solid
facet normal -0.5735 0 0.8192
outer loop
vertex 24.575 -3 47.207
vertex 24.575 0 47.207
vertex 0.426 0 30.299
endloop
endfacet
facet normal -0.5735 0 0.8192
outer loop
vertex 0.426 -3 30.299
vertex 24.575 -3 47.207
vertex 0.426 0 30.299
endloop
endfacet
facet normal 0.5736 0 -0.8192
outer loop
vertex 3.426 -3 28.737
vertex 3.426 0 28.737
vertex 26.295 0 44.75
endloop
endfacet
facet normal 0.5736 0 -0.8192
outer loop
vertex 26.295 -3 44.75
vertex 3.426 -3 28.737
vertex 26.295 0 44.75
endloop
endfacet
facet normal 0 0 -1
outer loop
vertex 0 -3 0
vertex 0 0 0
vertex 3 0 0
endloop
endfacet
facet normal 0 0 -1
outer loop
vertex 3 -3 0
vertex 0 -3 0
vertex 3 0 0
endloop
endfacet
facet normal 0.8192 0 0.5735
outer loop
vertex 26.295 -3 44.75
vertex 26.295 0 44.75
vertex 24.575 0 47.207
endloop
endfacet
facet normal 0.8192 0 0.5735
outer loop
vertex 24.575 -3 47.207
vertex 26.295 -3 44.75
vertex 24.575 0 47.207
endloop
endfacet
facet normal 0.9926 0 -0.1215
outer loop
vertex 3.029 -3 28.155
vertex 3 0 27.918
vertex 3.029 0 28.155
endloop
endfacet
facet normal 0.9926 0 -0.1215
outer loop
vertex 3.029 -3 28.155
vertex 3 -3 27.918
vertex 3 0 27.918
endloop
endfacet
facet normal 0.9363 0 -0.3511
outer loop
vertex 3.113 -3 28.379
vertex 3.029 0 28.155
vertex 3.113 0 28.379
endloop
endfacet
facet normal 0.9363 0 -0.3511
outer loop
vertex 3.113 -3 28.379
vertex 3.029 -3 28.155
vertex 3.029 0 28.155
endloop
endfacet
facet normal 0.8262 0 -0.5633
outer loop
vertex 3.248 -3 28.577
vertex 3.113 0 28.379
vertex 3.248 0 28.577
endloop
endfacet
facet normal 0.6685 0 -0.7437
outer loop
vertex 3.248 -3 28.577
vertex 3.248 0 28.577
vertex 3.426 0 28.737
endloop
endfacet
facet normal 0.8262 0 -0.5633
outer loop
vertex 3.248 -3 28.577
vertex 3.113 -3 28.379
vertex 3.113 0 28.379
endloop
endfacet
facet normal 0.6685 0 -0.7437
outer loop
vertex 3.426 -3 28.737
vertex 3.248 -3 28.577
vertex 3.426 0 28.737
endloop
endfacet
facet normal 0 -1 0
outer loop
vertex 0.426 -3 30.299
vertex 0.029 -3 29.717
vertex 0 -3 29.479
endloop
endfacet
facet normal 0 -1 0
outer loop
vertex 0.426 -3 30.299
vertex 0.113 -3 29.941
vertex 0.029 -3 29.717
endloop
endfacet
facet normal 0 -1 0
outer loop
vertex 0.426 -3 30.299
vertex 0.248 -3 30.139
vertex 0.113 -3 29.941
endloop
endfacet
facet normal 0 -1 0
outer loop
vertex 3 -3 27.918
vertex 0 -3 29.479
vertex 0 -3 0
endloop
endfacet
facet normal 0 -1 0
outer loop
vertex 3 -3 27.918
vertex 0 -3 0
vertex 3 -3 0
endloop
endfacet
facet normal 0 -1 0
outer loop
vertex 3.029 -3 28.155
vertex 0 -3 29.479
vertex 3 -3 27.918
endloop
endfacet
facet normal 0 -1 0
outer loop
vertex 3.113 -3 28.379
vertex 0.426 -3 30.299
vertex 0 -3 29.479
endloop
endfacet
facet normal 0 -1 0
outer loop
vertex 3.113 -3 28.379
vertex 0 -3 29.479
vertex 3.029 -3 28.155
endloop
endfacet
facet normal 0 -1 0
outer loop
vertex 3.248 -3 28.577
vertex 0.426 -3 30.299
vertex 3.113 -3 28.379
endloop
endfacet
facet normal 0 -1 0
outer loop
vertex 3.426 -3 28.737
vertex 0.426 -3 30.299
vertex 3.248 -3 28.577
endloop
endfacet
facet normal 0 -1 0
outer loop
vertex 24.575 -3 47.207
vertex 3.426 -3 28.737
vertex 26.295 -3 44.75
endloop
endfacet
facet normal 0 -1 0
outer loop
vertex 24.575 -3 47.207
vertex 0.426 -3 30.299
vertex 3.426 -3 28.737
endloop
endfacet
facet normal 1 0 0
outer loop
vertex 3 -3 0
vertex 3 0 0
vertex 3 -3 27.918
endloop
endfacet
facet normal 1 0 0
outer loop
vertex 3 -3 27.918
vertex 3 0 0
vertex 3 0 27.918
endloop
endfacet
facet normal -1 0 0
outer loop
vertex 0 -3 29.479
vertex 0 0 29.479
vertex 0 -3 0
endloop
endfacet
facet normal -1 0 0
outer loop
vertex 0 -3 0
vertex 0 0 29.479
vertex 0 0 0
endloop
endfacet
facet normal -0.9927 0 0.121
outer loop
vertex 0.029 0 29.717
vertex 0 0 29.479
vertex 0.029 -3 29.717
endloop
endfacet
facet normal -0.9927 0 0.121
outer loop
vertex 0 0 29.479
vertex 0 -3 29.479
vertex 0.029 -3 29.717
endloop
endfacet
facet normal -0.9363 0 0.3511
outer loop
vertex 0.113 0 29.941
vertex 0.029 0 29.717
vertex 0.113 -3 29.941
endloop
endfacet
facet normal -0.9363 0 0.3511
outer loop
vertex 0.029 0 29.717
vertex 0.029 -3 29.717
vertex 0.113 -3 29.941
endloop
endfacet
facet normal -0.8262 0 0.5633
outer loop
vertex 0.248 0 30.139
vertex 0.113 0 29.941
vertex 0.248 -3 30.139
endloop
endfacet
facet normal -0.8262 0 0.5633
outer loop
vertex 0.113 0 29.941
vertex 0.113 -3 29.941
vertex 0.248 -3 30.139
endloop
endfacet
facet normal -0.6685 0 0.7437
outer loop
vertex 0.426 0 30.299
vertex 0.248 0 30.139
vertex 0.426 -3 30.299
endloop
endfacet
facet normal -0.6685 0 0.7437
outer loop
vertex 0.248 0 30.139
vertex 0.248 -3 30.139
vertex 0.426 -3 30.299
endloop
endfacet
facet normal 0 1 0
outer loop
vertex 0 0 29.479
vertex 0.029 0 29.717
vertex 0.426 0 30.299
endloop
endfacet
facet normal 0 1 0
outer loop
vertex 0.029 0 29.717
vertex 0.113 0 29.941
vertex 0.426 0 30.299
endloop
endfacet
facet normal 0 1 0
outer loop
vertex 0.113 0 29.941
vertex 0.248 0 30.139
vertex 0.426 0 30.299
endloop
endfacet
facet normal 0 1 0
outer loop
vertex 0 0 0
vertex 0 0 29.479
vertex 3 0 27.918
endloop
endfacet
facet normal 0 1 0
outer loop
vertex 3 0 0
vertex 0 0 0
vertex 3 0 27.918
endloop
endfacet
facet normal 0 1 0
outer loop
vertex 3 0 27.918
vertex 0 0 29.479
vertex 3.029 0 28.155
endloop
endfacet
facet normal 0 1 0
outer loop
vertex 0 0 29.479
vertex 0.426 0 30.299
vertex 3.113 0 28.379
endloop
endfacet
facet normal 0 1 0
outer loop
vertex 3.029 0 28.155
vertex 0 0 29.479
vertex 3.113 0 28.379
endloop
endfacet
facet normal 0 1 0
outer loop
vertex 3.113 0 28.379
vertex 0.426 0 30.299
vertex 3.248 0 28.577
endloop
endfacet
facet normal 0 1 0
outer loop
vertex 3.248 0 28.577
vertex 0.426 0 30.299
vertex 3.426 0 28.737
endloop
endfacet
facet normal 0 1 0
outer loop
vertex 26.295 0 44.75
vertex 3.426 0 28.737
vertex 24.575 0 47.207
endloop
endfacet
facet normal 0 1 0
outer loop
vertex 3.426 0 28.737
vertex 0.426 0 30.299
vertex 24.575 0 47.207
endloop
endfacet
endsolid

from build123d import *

# Parameters (mm, degrees)
F1_DEPTH = 3
F2_R     = 1


with BuildPart() as f1:
    # F0 (on Front) → F1 (new body)
    with BuildSketch(Plane.XZ):
        Polygon((0, 30), (0, 0), (3, 0), (3, 28.438299), (1.720729, 27.542544), align=None)
        Polygon((3, 30), (0, 30), (1.720729, 27.542544), (3, 28.438299), align=None)
        Polygon((24.574561, 47.207293), (0, 30), (3, 30), (3, 28.438299), (26.295291, 44.749837), align=None)
    extrude(amount=F1_DEPTH)

    # F2
    f2_edges = [f1.edges().sort_by_distance(p)[0] for p in [
        (0, -1.5, 30),
        (3, -1.5, 28.438299),
    ]]
    fillet(f2_edges, radius=F2_R)


solid = f1.part
